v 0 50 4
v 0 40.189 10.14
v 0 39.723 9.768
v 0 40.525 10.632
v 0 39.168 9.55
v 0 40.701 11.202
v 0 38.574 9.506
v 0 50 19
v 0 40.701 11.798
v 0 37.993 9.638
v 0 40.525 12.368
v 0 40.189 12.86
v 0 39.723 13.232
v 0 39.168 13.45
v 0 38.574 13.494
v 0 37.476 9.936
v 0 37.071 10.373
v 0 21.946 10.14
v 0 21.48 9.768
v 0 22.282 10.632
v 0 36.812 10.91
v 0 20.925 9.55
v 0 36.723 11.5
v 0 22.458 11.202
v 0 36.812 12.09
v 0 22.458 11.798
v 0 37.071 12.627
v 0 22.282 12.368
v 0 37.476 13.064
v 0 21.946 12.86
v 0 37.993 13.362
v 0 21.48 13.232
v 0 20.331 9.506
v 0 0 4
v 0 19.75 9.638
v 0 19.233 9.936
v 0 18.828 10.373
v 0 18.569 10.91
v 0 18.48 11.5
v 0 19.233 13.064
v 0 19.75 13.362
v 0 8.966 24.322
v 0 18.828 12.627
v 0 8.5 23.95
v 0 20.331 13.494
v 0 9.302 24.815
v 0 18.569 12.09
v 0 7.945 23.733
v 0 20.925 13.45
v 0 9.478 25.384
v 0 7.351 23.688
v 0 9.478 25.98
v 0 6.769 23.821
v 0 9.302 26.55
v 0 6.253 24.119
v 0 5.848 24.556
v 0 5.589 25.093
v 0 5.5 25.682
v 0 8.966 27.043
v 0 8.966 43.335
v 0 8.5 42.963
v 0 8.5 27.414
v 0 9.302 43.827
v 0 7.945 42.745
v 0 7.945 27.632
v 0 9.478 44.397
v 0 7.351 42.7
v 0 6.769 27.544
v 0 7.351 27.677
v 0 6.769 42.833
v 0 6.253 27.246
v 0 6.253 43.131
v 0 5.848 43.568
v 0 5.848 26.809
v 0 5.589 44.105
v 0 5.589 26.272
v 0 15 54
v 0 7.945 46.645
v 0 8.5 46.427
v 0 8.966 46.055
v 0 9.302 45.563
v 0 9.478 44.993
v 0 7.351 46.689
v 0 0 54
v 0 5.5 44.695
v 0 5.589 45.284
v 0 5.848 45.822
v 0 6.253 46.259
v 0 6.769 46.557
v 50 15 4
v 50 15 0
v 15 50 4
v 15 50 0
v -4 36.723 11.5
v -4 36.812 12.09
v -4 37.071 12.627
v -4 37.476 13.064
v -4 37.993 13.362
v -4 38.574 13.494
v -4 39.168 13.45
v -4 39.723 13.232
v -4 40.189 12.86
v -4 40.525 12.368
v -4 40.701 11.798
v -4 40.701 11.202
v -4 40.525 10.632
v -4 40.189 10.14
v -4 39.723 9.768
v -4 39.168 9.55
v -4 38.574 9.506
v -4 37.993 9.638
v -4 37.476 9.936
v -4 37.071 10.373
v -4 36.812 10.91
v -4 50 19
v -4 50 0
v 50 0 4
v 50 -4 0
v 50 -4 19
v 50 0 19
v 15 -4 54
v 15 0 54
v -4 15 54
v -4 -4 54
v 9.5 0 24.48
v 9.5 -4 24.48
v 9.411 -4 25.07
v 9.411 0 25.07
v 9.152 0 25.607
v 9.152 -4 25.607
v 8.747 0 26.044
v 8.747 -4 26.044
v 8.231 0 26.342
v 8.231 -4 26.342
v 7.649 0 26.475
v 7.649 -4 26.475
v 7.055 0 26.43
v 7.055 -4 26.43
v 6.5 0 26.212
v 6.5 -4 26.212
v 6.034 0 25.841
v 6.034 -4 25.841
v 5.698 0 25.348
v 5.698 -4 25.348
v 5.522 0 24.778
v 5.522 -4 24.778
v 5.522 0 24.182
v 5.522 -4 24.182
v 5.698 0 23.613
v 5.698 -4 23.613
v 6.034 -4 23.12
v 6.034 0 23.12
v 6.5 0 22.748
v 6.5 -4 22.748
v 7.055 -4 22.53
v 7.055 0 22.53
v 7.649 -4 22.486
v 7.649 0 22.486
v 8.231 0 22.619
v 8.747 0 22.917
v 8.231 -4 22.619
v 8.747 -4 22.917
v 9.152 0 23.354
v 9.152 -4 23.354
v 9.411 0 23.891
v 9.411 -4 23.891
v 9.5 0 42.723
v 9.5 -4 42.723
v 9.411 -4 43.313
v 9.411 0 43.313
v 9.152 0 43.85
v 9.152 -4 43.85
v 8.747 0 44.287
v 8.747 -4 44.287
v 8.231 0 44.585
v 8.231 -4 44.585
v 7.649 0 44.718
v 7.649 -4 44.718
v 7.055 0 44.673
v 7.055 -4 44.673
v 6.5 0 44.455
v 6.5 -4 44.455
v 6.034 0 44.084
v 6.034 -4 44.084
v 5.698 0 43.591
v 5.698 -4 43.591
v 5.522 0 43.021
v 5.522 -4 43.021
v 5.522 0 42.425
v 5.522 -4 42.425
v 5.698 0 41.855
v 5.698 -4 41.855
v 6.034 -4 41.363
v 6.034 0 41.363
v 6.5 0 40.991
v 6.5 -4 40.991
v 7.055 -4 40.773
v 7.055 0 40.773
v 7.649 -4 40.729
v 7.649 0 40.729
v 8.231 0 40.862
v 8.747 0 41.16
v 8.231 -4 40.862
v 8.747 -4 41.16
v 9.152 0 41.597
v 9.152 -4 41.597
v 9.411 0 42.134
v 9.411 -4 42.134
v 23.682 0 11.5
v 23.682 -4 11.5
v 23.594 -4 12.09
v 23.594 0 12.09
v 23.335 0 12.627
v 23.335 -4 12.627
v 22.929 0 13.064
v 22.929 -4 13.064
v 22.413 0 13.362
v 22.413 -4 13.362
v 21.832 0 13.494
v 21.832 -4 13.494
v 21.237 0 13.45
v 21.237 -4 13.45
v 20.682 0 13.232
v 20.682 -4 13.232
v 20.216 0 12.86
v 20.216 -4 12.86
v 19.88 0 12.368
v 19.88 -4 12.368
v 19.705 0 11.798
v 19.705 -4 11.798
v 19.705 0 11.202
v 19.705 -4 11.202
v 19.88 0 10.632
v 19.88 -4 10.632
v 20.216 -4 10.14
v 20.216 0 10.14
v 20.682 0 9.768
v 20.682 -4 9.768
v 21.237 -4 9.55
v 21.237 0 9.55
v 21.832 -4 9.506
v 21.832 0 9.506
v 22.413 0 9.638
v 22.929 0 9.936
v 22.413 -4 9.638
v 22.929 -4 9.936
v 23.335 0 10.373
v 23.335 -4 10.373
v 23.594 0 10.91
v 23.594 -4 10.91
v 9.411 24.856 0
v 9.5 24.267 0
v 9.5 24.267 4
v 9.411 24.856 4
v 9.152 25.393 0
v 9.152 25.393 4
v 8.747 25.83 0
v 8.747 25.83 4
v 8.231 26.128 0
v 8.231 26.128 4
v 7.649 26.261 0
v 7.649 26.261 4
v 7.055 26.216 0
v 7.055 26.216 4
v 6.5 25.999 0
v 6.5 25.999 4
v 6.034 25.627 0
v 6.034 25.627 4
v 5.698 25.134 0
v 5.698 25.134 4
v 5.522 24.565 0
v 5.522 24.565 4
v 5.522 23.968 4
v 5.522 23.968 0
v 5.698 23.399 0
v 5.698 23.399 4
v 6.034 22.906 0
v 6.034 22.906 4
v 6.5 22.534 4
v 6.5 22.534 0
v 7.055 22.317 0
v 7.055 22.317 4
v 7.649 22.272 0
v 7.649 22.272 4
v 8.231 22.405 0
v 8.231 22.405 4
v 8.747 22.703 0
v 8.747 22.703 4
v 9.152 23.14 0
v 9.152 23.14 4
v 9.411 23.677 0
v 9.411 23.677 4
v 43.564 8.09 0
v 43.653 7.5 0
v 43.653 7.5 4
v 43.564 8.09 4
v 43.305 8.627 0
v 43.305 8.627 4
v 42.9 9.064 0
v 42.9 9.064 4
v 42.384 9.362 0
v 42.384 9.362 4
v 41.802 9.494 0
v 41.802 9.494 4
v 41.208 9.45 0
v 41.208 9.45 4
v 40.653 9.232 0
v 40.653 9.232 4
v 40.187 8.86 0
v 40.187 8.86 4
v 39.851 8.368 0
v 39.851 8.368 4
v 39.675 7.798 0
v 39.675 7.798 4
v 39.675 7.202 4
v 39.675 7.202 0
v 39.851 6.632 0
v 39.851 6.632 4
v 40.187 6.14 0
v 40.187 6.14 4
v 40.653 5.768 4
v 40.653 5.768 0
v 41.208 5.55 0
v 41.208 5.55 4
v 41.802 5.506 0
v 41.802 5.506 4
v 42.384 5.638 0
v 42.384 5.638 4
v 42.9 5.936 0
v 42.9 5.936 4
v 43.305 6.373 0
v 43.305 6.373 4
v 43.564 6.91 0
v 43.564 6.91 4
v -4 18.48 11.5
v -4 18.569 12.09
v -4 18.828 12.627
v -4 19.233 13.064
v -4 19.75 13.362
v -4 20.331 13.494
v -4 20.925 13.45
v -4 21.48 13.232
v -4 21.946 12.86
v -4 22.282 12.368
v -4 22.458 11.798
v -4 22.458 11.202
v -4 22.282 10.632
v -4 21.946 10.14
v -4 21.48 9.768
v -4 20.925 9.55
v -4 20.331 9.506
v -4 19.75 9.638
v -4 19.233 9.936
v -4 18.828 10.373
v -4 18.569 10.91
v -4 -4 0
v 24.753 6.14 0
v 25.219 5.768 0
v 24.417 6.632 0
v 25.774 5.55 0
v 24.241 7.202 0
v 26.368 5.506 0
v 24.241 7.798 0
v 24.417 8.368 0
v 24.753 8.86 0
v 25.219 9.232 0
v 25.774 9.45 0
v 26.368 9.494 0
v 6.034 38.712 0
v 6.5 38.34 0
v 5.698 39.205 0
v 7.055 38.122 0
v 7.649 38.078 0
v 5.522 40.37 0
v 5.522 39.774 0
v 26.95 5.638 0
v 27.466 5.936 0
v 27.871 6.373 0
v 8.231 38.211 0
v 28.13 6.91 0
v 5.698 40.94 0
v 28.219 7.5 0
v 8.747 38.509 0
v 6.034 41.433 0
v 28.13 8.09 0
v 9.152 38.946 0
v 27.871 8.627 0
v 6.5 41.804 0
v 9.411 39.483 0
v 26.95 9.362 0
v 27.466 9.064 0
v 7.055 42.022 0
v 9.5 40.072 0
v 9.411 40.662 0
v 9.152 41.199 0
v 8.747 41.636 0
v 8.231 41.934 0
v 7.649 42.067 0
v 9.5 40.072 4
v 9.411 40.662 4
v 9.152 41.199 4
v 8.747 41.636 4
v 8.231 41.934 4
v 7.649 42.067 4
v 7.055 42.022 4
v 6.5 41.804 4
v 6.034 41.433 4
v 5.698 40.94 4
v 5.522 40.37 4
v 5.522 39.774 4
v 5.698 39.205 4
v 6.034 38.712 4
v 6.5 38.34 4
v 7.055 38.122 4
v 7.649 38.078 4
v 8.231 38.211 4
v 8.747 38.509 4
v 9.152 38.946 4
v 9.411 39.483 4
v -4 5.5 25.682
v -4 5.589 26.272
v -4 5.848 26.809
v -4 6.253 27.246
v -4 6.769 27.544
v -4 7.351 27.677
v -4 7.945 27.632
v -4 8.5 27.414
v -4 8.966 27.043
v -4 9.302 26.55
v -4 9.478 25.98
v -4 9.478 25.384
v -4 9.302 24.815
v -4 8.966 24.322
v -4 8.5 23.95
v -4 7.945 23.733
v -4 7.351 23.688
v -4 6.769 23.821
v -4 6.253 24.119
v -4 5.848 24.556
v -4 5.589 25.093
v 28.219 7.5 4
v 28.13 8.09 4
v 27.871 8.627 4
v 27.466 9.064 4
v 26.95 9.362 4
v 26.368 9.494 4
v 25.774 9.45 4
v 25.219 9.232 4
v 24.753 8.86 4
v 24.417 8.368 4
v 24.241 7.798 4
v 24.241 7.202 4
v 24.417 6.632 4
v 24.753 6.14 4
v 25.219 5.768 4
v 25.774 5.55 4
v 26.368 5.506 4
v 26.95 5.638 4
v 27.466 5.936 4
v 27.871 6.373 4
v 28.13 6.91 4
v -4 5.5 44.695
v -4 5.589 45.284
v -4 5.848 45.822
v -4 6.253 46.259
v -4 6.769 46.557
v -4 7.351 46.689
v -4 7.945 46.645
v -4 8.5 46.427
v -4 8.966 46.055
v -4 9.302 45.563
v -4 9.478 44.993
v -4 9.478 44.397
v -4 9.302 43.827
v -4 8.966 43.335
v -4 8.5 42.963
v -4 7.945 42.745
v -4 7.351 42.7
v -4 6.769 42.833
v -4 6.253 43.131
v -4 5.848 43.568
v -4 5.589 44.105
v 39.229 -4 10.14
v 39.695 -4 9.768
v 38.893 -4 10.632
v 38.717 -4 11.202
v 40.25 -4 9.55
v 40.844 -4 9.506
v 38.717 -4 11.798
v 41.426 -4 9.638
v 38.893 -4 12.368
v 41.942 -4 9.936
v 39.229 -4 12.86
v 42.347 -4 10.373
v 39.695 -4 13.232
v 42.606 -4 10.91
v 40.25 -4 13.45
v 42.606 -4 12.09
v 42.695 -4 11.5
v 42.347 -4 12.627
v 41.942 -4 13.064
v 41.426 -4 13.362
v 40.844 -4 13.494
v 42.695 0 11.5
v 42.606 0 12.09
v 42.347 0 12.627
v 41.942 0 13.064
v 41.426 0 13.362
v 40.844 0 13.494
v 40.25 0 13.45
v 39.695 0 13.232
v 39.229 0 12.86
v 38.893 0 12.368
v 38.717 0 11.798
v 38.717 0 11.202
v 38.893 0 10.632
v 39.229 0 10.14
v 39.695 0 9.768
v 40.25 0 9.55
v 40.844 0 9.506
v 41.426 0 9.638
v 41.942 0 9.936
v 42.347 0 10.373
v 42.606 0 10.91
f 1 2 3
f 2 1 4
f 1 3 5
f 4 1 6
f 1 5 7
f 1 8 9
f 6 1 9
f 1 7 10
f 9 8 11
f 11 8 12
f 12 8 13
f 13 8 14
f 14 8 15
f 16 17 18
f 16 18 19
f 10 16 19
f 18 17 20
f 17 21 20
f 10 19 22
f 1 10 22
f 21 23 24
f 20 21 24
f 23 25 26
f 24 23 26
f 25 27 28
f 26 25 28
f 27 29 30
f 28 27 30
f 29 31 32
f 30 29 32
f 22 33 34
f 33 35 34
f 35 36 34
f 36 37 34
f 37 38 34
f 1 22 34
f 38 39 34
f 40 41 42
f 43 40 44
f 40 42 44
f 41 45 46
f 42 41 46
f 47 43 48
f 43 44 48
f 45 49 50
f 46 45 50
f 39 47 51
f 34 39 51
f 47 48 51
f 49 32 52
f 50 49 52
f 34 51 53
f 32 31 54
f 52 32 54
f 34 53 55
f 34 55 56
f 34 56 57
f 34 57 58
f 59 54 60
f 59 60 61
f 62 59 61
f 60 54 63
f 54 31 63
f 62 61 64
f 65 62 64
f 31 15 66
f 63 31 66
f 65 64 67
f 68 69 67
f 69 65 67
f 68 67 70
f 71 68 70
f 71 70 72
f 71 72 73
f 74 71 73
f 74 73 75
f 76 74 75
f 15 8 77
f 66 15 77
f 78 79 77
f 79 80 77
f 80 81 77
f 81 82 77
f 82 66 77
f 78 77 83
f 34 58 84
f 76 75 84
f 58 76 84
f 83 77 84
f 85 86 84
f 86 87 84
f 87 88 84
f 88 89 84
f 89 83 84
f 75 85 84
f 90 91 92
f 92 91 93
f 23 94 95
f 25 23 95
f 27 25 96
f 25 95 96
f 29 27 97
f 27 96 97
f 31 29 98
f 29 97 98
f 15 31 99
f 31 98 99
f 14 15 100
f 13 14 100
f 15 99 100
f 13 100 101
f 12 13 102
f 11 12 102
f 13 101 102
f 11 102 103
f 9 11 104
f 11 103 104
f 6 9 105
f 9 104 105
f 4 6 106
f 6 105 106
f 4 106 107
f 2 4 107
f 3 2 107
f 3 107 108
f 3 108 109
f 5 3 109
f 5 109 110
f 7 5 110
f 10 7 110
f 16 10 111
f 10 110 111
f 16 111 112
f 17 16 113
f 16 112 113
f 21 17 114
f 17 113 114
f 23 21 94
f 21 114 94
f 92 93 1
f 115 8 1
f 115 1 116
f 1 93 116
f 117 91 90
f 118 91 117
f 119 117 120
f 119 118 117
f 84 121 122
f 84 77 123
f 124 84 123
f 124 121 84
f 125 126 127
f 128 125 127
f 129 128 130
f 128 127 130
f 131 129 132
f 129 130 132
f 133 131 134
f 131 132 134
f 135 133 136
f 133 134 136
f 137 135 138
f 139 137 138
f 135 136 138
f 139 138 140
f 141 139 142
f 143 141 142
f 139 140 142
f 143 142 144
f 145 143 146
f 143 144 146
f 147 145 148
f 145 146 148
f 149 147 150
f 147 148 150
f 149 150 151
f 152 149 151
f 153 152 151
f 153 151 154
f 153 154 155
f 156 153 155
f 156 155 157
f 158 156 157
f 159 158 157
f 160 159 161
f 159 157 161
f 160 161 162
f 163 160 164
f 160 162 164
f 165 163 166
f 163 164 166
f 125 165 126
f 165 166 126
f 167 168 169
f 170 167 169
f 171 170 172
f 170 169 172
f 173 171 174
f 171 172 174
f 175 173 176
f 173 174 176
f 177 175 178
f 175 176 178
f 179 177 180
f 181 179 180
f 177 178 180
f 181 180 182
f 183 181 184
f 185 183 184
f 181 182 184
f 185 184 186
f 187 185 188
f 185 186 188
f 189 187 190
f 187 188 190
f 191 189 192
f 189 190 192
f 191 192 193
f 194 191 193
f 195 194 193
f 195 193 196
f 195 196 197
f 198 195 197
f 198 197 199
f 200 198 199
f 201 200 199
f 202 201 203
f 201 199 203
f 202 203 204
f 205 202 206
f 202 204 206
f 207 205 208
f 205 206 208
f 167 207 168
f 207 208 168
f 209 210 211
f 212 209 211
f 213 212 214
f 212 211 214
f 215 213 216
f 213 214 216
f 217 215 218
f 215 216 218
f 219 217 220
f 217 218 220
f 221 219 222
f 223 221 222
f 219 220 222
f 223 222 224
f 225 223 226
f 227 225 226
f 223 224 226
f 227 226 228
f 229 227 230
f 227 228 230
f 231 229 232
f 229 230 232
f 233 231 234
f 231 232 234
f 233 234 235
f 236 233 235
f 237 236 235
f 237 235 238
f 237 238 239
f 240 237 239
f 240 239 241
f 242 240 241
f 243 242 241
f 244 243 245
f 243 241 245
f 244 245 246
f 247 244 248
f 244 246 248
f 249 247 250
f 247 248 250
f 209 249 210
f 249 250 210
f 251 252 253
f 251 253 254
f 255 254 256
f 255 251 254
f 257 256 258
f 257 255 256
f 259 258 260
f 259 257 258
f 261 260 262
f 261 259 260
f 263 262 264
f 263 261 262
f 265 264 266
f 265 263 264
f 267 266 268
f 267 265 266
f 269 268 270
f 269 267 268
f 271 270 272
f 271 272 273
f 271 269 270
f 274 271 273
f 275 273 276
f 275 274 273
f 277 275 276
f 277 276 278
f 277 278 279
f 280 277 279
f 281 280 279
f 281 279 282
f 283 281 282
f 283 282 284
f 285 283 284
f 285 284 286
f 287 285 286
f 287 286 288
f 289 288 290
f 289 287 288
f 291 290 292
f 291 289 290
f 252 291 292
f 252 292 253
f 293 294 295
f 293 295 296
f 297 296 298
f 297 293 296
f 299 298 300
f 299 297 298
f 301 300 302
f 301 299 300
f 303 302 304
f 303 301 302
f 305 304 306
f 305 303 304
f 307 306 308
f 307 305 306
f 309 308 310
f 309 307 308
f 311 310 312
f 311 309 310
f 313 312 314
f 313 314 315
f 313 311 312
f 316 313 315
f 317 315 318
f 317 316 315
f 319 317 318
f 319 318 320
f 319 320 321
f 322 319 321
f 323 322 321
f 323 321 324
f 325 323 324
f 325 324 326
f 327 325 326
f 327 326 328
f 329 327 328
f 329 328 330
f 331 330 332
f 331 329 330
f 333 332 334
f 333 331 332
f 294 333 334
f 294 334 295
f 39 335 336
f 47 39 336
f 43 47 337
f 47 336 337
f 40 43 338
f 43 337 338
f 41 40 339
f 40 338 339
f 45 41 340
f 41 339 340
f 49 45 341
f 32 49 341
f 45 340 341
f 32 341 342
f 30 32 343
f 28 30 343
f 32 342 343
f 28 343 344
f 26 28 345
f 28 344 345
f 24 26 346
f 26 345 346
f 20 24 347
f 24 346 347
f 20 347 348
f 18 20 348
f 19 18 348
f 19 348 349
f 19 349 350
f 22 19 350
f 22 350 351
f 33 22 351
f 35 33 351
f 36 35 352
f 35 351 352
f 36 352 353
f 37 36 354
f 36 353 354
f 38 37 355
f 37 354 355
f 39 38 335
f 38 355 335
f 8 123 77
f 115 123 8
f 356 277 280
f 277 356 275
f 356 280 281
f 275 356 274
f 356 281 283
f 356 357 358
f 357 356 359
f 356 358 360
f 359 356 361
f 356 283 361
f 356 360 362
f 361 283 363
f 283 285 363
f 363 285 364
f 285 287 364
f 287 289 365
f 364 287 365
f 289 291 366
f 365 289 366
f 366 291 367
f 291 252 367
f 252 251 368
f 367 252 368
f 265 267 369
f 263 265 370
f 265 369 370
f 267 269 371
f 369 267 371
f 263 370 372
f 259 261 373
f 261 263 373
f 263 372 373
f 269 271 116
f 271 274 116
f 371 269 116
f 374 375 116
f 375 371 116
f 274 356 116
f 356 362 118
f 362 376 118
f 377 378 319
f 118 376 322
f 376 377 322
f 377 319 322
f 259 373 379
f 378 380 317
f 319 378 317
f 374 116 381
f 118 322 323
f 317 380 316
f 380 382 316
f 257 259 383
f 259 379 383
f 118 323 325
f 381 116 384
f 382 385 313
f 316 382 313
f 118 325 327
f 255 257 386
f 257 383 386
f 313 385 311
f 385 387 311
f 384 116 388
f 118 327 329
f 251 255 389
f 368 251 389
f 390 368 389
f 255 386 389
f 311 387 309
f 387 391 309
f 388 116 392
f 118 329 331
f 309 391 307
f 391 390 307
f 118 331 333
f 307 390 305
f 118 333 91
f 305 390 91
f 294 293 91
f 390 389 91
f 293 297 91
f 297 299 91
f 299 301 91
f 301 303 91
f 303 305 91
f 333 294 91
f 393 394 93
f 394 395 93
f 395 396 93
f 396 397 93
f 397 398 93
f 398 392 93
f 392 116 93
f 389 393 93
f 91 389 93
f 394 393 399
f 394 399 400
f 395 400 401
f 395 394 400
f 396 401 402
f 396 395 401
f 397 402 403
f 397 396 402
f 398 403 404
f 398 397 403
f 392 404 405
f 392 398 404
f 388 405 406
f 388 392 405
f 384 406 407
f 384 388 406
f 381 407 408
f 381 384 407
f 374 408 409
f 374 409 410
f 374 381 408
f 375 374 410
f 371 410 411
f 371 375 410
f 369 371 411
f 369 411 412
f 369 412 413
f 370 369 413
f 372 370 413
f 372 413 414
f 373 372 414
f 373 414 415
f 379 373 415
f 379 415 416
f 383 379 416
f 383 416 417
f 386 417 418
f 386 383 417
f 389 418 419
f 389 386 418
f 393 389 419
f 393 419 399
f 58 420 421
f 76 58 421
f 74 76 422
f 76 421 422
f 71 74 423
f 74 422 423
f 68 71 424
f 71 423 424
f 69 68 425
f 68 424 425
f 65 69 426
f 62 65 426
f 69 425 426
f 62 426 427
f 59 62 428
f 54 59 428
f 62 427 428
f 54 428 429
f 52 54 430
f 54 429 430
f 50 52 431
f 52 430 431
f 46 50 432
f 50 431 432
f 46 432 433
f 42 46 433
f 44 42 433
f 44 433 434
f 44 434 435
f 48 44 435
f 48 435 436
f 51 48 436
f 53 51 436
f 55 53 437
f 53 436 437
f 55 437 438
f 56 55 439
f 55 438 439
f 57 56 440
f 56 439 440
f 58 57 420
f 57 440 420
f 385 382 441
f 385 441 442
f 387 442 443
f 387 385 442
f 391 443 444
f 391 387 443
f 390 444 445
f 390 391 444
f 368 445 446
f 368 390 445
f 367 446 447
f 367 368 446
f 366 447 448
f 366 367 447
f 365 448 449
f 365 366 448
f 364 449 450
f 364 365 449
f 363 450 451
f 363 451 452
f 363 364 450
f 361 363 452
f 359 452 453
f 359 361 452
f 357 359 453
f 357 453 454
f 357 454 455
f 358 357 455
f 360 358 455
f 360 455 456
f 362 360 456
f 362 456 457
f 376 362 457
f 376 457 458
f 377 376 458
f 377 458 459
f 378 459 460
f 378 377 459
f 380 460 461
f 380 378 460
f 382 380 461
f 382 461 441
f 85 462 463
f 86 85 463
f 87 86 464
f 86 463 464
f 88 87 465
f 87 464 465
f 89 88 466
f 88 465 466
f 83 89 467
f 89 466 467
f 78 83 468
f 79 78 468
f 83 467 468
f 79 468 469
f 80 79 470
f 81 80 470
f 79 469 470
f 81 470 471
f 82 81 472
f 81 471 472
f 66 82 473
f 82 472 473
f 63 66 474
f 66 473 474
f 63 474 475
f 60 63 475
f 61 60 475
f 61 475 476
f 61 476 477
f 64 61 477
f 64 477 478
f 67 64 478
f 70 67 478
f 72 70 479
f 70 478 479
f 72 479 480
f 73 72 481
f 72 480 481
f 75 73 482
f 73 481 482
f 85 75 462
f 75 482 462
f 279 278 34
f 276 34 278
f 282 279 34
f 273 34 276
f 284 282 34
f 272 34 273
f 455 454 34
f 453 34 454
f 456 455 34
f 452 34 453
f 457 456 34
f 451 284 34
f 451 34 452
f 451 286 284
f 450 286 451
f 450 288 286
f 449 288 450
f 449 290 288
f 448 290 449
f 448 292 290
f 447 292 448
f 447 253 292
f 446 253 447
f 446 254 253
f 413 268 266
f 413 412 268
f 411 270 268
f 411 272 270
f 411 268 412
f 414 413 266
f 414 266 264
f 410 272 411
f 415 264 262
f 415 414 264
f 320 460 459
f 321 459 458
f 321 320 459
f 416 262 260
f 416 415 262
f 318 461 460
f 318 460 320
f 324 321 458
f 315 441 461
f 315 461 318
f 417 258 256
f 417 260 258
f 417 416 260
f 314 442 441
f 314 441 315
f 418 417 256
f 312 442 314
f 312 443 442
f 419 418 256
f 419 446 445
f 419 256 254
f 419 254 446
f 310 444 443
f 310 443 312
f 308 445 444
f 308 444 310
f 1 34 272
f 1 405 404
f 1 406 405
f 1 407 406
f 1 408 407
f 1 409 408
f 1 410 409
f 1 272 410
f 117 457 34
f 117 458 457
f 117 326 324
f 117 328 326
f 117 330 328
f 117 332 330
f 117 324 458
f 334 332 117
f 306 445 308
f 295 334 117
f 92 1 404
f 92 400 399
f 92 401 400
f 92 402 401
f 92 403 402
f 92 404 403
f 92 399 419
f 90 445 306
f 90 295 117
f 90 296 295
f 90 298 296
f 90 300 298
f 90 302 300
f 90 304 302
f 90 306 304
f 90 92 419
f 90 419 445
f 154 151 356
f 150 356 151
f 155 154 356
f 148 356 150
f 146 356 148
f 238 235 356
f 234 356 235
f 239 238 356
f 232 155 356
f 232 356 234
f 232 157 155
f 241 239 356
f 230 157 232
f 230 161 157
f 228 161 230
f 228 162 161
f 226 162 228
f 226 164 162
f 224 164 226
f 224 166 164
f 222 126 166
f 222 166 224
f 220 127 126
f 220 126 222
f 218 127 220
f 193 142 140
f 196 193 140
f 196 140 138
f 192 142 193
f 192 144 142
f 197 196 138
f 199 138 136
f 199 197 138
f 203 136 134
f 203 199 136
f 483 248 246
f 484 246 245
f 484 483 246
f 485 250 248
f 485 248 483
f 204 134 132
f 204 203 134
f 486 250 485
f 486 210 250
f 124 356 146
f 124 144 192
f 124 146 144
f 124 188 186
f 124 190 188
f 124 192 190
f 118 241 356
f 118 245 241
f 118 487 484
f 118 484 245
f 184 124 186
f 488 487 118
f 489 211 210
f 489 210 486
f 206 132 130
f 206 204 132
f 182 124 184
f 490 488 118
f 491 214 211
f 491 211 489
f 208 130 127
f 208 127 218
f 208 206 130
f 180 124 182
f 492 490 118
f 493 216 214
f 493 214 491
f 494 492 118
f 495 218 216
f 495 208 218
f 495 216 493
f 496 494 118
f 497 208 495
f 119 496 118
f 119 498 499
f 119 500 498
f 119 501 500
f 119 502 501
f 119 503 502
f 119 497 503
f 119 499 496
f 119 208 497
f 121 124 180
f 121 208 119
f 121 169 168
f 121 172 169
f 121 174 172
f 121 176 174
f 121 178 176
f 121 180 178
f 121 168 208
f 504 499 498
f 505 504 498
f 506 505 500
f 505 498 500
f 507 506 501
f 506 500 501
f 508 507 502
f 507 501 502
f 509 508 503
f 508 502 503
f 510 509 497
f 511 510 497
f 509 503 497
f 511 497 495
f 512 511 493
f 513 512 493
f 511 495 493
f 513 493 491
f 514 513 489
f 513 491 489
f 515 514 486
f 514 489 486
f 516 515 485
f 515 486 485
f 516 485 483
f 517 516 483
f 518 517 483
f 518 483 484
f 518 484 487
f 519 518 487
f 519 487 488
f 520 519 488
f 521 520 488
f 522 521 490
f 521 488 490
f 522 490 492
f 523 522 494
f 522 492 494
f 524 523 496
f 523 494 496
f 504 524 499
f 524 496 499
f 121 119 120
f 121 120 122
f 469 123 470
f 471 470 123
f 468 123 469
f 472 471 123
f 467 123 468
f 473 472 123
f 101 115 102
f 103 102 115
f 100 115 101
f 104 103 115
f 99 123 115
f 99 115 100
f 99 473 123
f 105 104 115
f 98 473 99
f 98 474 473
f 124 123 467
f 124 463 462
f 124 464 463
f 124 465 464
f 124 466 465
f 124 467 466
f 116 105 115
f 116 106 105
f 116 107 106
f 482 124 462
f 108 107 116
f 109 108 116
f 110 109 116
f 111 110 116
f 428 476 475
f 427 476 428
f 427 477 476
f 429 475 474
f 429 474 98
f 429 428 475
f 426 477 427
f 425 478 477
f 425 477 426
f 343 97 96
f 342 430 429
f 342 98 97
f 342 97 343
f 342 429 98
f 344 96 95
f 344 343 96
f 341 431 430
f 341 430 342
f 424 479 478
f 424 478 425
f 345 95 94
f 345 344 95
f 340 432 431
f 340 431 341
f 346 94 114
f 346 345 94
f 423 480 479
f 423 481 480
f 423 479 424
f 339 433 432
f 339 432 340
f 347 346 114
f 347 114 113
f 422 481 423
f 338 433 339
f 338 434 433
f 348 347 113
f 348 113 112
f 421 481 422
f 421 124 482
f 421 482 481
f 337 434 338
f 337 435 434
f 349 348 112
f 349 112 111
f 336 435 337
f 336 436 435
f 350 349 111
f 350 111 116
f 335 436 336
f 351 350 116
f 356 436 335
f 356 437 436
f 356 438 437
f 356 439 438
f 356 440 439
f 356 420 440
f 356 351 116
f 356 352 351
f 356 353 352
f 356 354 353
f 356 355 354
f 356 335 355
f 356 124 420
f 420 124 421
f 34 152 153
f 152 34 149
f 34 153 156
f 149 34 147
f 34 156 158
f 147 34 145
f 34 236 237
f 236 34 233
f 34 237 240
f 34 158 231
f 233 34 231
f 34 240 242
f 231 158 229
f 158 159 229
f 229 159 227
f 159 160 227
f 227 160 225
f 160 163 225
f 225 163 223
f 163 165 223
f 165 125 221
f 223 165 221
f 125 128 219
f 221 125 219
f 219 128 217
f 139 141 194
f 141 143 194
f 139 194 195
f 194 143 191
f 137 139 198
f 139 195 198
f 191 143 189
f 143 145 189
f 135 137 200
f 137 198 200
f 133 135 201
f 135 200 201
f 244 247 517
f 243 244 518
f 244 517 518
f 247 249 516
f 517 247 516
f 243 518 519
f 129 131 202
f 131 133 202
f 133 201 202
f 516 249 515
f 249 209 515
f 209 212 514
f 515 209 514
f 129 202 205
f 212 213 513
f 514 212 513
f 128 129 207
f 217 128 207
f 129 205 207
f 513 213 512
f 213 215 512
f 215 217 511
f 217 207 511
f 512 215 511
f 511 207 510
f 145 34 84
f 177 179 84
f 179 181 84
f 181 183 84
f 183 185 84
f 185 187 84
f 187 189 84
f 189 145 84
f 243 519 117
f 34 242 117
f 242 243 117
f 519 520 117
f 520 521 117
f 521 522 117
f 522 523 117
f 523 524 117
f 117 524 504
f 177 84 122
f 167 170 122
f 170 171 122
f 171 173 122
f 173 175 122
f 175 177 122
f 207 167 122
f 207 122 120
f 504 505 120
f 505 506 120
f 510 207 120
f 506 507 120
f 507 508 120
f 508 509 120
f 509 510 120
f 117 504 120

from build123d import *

# Parameters (mm, degrees)
F0_R     = 2
F1_DEPTH = 4
F2_R     = 2
F3_DEPTH = 4
F4_R     = 2
F5_DEPTH = 4


with BuildPart() as f1:
    # F0 (on Top) → F1 (new body)
    with BuildSketch(Plane.XY):
        Polygon((15, 50), (0, 50), (-4, 50), (-4, 0), (-4, -4), (50, -4), (50, 0), (50, 15), align=None)
        with Locations((26.219012, 7.5)):
            Circle(F0_R, mode=Mode.SUBTRACT)
        with Locations((41.652899, 7.5)):
            Circle(F0_R, mode=Mode.SUBTRACT)
        with Locations((7.5, 24.26653)):
            Circle(F0_R, mode=Mode.SUBTRACT)
        with Locations((7.5, 40.072314)):
            Circle(F0_R, mode=Mode.SUBTRACT)
    extrude(amount=F1_DEPTH)

    # F2 (on face) → F3 (join)
    with BuildSketch(Plane.XZ.offset(4)):
        Polygon((-4, 54), (-4, 4), (50, 4), (50, 19), (15, 54), align=None)
        with Locations((21.682408, 11.5)):
            Circle(F2_R, mode=Mode.SUBTRACT)
        with Locations((7.5, 24.480278)):
            Circle(F2_R, mode=Mode.SUBTRACT)
        with Locations((40.694896, 11.5)):
            Circle(F2_R, mode=Mode.SUBTRACT)
        with Locations((7.5, 42.723257)):
            Circle(F2_R, mode=Mode.SUBTRACT)
    extrude(amount=-F3_DEPTH)

    # F4 (on face) → F5 (join)
    with BuildSketch(Plane(origin=(-4, 0, 0), x_dir=(0, -1, 0), z_dir=(-1, 0, 0))):
        Polygon((-50, 0), (0, 0), (0, 54), (-15, 54), (-50, 19), align=None)
        with Locations((-38.723257, 11.5)):
            Circle(F4_R, mode=Mode.SUBTRACT)
        with Locations((-20.480278, 11.5)):
            Circle(F4_R, mode=Mode.SUBTRACT)
        with Locations((-7.5, 25.682408)):
            Circle(F4_R, mode=Mode.SUBTRACT)
        with Locations((-7.5, 44.694896)):
            Circle(F4_R, mode=Mode.SUBTRACT)
    extrude(amount=-F5_DEPTH)


solid = f1.part
